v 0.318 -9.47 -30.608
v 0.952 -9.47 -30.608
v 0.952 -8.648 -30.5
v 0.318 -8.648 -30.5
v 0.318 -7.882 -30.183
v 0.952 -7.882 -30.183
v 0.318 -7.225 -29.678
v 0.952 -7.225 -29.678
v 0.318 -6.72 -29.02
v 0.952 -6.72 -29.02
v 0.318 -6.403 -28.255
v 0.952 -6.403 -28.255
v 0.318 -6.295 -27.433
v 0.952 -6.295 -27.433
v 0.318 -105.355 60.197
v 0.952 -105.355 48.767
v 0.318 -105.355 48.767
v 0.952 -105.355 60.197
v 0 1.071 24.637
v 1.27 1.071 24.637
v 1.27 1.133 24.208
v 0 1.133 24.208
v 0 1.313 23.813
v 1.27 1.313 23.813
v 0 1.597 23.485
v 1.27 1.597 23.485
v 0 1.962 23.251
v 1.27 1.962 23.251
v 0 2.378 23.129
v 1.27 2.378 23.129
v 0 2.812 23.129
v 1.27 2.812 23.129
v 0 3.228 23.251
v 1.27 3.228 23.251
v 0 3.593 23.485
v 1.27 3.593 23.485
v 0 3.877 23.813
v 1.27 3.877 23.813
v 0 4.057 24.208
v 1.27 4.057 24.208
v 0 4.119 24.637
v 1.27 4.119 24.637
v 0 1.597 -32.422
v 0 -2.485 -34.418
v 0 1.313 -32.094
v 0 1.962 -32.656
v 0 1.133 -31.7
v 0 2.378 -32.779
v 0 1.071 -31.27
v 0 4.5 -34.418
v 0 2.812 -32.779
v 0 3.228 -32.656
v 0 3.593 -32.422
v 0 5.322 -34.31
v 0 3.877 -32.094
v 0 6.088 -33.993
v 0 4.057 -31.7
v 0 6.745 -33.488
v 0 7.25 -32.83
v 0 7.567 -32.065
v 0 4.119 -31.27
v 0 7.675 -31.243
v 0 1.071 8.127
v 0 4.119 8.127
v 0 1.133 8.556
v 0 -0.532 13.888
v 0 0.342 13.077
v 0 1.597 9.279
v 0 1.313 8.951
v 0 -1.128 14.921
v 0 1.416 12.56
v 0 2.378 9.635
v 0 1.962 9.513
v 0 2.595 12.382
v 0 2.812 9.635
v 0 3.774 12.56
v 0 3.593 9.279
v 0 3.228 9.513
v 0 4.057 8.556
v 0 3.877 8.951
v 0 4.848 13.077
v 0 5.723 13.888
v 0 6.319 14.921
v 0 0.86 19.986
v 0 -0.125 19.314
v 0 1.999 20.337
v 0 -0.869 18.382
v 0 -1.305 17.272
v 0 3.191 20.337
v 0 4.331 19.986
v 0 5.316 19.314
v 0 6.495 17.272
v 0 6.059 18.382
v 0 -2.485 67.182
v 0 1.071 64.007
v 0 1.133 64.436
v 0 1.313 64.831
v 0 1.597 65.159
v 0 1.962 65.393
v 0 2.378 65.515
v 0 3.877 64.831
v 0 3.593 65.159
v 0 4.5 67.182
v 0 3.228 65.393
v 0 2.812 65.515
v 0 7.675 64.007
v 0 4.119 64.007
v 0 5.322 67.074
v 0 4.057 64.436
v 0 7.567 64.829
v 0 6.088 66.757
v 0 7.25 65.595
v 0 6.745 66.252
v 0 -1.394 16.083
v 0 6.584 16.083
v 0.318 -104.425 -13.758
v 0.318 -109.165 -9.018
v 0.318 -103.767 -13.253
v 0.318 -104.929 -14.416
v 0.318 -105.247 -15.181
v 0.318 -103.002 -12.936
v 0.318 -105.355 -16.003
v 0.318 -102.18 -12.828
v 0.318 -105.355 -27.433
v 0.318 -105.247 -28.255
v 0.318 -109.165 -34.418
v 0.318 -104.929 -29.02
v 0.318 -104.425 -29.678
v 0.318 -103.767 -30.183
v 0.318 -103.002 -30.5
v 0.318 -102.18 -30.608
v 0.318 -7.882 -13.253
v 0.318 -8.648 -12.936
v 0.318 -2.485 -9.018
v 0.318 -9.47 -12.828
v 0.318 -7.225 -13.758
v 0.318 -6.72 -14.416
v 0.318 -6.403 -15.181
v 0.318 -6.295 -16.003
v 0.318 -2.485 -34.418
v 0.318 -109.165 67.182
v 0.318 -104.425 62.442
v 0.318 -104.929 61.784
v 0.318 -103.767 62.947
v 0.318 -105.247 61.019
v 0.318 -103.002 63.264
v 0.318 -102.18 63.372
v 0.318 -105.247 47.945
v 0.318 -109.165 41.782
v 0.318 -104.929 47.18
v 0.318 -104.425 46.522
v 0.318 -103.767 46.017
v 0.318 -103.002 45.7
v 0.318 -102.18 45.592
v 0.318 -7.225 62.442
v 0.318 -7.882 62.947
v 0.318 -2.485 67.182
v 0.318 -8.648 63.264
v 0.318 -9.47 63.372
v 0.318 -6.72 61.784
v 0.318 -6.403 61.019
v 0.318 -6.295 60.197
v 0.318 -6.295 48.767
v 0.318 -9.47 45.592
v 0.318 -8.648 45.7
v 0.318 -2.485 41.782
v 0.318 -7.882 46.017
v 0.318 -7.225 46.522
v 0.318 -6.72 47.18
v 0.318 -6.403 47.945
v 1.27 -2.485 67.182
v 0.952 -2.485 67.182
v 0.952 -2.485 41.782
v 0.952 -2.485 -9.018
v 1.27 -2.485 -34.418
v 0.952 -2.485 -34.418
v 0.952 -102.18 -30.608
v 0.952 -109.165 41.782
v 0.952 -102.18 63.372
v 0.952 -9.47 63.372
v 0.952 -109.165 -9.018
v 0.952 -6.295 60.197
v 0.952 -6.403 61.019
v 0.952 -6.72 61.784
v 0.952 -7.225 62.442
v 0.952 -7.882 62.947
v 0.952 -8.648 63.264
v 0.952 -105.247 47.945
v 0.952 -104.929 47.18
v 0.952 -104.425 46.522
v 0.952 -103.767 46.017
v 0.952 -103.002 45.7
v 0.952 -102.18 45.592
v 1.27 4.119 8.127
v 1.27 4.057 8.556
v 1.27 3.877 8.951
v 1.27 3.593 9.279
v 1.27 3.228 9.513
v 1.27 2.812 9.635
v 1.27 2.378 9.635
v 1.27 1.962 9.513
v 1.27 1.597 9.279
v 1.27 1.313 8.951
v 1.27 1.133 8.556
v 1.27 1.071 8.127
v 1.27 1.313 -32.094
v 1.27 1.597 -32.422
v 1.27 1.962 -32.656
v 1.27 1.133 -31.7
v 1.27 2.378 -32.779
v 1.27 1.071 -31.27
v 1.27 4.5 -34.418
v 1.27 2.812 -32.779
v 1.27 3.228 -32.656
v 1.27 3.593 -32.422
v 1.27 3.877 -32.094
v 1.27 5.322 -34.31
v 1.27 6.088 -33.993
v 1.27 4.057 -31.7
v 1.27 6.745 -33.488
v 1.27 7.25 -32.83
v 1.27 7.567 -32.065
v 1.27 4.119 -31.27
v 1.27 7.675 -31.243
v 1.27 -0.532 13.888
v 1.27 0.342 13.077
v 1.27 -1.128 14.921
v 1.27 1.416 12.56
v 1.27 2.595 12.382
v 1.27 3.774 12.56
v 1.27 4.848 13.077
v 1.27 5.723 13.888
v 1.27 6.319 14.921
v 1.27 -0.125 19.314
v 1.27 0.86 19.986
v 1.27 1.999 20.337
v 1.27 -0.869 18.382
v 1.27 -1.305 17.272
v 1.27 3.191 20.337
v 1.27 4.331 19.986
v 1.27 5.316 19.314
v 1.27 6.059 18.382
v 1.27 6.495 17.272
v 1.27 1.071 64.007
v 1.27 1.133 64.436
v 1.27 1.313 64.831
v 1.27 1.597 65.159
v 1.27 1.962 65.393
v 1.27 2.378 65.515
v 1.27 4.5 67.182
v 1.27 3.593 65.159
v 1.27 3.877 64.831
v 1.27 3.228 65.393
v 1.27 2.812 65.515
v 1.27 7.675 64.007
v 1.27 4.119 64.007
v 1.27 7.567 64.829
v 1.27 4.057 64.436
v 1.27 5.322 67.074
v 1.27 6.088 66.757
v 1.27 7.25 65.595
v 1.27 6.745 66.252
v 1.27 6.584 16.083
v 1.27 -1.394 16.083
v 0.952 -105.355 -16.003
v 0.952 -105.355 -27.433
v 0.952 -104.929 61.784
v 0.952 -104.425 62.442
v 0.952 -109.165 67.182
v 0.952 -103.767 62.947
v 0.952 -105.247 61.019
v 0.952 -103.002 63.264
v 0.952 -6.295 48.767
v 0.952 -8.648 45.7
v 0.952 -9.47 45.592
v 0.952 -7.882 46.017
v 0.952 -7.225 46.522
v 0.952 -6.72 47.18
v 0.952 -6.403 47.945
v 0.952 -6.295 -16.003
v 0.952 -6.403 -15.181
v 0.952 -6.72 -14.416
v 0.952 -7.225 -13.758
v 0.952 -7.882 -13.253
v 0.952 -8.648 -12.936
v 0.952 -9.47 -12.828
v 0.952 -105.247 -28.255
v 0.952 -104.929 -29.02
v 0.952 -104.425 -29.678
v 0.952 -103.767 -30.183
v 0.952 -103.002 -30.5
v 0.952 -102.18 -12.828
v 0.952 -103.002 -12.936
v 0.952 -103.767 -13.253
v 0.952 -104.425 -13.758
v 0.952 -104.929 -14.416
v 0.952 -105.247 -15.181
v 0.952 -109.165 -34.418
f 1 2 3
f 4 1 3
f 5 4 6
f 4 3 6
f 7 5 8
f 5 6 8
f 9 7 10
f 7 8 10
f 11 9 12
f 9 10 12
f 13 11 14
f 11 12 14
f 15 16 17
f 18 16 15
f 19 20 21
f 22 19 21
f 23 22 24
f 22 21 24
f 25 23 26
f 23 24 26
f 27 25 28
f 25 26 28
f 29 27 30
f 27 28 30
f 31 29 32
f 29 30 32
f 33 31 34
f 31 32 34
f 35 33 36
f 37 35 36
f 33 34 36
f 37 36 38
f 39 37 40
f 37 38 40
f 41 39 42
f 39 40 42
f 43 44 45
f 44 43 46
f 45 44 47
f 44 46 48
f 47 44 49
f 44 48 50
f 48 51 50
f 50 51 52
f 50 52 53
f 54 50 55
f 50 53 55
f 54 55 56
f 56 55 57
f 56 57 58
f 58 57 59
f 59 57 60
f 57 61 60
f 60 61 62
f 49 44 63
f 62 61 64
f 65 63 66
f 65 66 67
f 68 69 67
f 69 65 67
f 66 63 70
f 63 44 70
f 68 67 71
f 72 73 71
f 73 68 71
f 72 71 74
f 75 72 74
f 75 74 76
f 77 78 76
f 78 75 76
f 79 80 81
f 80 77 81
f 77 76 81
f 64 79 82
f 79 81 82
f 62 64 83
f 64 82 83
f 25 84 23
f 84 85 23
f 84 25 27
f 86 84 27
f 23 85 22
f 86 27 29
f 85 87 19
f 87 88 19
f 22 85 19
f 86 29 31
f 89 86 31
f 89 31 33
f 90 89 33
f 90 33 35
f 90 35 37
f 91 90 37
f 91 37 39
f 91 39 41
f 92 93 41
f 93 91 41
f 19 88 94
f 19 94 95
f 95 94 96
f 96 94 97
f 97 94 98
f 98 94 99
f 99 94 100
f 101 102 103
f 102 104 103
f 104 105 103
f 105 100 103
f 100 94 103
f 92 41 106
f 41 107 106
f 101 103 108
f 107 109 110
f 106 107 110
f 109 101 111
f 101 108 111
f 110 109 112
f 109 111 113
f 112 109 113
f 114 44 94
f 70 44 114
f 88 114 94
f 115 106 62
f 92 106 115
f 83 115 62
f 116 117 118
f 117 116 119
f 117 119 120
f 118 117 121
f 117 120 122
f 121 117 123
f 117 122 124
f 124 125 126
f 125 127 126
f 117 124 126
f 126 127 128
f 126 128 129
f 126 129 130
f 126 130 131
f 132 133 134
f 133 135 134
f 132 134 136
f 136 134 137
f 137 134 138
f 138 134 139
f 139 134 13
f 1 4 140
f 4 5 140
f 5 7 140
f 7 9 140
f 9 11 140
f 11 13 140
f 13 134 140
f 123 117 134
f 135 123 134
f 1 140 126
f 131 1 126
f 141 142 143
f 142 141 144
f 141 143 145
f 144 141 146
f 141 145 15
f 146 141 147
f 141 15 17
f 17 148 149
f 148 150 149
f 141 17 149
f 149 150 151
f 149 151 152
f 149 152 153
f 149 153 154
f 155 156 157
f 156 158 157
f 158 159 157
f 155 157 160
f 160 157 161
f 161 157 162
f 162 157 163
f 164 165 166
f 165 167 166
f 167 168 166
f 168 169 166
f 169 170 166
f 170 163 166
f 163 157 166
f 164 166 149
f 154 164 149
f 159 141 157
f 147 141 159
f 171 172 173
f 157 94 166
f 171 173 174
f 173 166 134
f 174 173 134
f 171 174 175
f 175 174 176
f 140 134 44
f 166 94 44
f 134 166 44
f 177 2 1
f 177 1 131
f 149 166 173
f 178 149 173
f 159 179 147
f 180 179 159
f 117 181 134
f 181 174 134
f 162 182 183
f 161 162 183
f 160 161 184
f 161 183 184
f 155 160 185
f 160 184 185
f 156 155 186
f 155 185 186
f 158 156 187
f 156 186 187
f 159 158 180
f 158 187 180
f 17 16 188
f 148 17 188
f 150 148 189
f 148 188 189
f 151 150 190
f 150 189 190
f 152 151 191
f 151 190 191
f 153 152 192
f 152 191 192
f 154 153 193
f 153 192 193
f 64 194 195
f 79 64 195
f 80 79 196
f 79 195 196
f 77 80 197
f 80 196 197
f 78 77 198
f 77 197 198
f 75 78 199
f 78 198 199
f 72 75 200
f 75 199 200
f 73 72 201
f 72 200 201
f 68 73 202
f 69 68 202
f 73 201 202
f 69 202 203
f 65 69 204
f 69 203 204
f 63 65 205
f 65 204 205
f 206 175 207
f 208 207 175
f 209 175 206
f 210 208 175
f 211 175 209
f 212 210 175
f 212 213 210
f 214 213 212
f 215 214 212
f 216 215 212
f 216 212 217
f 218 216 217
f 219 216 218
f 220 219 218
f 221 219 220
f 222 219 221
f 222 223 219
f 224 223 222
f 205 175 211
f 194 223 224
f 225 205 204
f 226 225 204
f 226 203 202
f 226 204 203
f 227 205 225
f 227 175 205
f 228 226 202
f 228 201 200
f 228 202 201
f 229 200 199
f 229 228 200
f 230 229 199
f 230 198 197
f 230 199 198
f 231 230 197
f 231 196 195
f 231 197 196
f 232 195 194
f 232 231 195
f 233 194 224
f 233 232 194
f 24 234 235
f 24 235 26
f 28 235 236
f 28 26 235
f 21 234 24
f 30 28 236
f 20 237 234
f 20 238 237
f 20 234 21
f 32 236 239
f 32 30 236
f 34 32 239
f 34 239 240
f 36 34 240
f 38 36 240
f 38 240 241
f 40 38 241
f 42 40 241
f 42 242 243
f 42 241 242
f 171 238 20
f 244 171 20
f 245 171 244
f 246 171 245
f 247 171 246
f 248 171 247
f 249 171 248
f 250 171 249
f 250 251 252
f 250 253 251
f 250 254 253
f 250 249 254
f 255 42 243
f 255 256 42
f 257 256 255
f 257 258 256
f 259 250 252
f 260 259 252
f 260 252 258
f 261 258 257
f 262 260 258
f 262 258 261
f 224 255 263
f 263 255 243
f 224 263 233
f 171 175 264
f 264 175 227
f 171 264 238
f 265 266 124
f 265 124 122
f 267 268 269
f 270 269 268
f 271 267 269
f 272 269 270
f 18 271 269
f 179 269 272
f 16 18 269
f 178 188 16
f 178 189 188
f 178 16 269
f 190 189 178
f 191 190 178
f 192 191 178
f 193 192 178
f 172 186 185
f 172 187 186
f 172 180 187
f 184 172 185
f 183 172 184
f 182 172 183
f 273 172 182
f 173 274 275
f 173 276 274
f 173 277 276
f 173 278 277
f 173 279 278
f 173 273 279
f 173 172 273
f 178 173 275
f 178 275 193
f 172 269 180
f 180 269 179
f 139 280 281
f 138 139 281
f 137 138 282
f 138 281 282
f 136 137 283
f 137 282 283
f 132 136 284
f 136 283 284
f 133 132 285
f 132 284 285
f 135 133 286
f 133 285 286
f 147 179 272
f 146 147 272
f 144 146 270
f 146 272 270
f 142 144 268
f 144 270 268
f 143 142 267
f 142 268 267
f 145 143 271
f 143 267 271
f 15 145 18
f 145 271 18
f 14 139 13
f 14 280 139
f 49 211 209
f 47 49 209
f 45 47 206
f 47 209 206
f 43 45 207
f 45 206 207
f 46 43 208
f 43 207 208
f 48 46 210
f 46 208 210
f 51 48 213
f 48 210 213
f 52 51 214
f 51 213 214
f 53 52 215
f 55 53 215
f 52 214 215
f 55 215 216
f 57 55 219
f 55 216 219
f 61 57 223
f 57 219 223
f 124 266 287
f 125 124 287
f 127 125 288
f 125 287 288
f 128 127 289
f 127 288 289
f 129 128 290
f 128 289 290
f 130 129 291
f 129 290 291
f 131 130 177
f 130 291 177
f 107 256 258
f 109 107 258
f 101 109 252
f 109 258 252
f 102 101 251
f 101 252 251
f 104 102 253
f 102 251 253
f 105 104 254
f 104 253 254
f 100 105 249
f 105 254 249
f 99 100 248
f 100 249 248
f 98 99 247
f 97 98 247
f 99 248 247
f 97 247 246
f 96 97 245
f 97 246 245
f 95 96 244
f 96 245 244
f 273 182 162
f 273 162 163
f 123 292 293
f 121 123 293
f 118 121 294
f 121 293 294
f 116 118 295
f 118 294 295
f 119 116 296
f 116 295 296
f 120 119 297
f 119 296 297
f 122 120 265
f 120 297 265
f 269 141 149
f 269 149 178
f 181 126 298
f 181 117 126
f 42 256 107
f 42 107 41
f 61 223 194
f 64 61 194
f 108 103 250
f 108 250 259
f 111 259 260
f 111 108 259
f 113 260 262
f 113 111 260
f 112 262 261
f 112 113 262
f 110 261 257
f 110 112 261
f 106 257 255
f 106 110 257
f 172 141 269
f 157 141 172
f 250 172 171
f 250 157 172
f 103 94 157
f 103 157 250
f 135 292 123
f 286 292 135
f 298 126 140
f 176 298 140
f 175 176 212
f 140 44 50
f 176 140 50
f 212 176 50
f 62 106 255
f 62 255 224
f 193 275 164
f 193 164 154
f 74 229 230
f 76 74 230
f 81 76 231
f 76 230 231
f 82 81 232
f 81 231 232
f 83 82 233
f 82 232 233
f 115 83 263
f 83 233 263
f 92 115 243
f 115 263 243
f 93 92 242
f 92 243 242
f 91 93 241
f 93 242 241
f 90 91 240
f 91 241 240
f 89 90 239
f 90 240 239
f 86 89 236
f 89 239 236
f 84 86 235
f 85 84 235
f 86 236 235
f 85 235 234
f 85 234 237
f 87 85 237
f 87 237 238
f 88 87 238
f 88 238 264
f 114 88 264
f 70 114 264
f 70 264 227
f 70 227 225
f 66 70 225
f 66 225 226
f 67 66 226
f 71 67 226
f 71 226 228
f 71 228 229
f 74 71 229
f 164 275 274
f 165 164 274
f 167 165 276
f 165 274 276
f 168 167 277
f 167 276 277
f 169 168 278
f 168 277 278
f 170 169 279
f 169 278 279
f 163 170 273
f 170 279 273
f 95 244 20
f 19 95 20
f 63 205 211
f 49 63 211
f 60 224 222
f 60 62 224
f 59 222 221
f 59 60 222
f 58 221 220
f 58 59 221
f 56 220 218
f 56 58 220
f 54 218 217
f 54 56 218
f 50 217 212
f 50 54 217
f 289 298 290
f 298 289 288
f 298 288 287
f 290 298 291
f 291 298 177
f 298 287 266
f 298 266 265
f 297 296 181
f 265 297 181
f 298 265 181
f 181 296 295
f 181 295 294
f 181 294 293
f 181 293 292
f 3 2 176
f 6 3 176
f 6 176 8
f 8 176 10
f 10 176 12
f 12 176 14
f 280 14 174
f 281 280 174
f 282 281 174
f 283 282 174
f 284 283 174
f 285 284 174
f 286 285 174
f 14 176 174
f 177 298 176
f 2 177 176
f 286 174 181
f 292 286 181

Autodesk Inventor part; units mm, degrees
ref_plane "YZ Plane" through (0, 0, 0) normal (1, 0, 0) x (0, 1, 0)
ref_plane "XZ Plane" through (0, 0, 0) normal (0, 1, 0) x (-1, 0, 0)
ref_plane "XY Plane" through (0, 0, 0) normal (0, 0, 1) x (1, 0, 0)
sketch "Sketch1" plane through (0, 0, 0) normal (1, 0, 0) x (0, 1, 0)
  line L0 (7.6752, 16.382) -> (7.6752, -31.243)
  line L1 (7.6752, 16.382) -> (7.6752, 64.007)
  line L2 (-2.4848, 16.382) -> (-2.4848, 64.007)
  line L3 (0.6902, 67.182) -> (4.5002, 67.182)
  line L4 (-2.4848, 16.382) -> (-2.4848, -31.243)
  line L5 (0.6902, -34.418) -> (4.5002, -34.418)
  arc A0 (7.6752, 64.007) -> (4.5002, 67.182) centre (4.5002, 64.007) ccw
  arc A1 (4.5002, -34.418) -> (7.6752, -31.243) centre (4.5002, -31.243) ccw
  line L6 (-2.4848, 64.007) -> (-2.4848, 67.182)
  line L7 (-2.4848, 67.182) -> (0.6902, 67.182)
  line L8 (-2.4848, -31.243) -> (-2.4848, -34.418)
  line L9 (0.6902, -34.418) -> (-2.4848, -34.418)
  circle A2 centre (2.5952, 16.382) radius 4
  point P0 (0, 0)
  point P1 (7.6752, -34.418)
  point P2 (7.6752, 67.182)
  dimension "d1" = 50.8
  dimension "d2" = 50.8
  dimension "d3" = 3.175
  dimension "d101" = 8
extrude "Extrusion1" add sketch "Sketch1" along normal blind 1.27 contours L0 A1 L5 L9 L8 L4 L2 L6 L7 L3 A0 L1 | A2
sketch "Sketch4" plane through (0, -2.4848, 16.382) normal (0, -1, 0) x (1, 0, 0)
  line L0 (1.27, 50.8) -> (1.27, -50.8) projected
  line L1 (1.27, 0) -> (1.27, 47.625) projected
  line L2 (0.9525, 50.8) -> (0.9525, 25.4)
  line L3 (0.9525, 50.8) -> (0.3175, 50.8)
  line L4 (0.3175, 50.8) -> (0.3175, 25.4)
  line L5 (0.3175, 25.4) -> (0.9525, 25.4)
  line L6 (0, -50.8) -> (1.27, -50.8) projected
  line L7 (0.9525, -50.8) -> (0.9525, -25.4)
  line L8 (0.9525, -25.4) -> (0.3175, -25.4)
  line L9 (0.3175, -25.4) -> (0.3175, -50.8)
  line L10 (0.9525, -50.8) -> (0.3175, -50.8)
  point P0 (0, -16.382)
  dimension "d27" = 25.4
  dimension "d28" = 0.635
  dimension "d29" = 25.4
  dimension "d31" = 25.4
  dimension "d32" = 0.635
extrude "Extrusion3" add sketch "Sketch4" along normal blind 106.68
sketch "Sketch5" plane through (0.9525, -2.4848, 67.182) normal (1, 0, 0) x (0, 0, -1)
  line L0 (0, 6.985) -> (0, 0) projected
  line L1 (0, 0) -> (0, -106.68) projected
  line L2 (25.4, 0) -> (25.4, -106.68) projected
  line L3 (0, 0) -> (101.6, 0) projected
  line L4 (6.985, -3.81) -> (18.415, -3.81)
  line L5 (21.59, -6.985) -> (21.59, -99.695)
  line L6 (18.415, -102.87) -> (6.985, -102.87)
  line L7 (3.81, -99.695) -> (3.81, -6.985)
  line L8 (25.4, -106.68) -> (0, -106.68) projected
  arc A0 (6.985, -3.81) -> (3.81, -6.985) centre (6.985, -6.985) ccw
  arc A1 (21.59, -6.985) -> (18.415, -3.81) centre (18.415, -6.985) ccw
  arc A2 (3.81, -99.695) -> (6.985, -102.87) centre (6.985, -99.695) ccw
  arc A3 (18.415, -102.87) -> (21.59, -99.695) centre (18.415, -99.695) ccw
  line L9 (83.185, -3.81) -> (94.615, -3.81)
  line L10 (97.79, -6.985) -> (97.79, -99.695)
  line L11 (94.615, -102.87) -> (83.185, -102.87)
  line L12 (80.01, -99.695) -> (80.01, -6.985)
  line L13 (101.6, 0) -> (101.6, -106.68) projected
  line L14 (50.8, 0) -> (101.6, 0) projected
  line L15 (76.2, 0) -> (76.2, -106.68) projected
  line L16 (101.6, -106.68) -> (76.2, -106.68) projected
  arc A4 (83.185, -3.81) -> (80.01, -6.985) centre (83.185, -6.985) ccw
  arc A5 (97.79, -6.985) -> (94.615, -3.81) centre (94.615, -6.985) ccw
  arc A6 (80.01, -99.695) -> (83.185, -102.87) centre (83.185, -99.695) ccw
  arc A7 (94.615, -102.87) -> (97.79, -99.695) centre (94.615, -99.695) ccw
  point P0 (67.182, 2.4848)
  dimension "d67" = 3.81
  dimension "d68" = 3.81
  dimension "d69" = 3.81
  dimension "d70" = 3.81
  dimension "d71" = 3.175
  dimension "d72" = 3.81
  dimension "d73" = 3.81
  dimension "d74" = 3.81
  dimension "d75" = 3.81
  dimension "d76" = 3.175
extrude "Extrusion5" cut sketch "Sketch5" against normal through all contours L4 A1 L5 A3 L6 A2 L7 A0 | L9 A5 L10 A7 L11 A6 L12 A4
sketch "Sketch6" plane through (1.27, 0, 0) normal (1, 0, 0) x (0, 0, -1)
  line L0 (-67.182, -2.4848) -> (34.418, -2.4848) projected
  line L1 (-16.382, 7.6752) -> (-64.007, 7.6752) projected
  line L2 (-41.782, -2.4848) -> (-67.182, -2.4848) projected
  arc A0 (-64.007, 4.1192) -> (-64.007, 1.0712) centre (-64.007, 2.5952) ccw
  arc A1 (-16.382, 7.6752) -> (-16.382, -2.4848) centre (-16.382, 2.5952) ccw projected
  arc A2 (-24.637, 1.0712) -> (-24.637, 4.1192) centre (-24.637, 2.5952) ccw
  line L3 (-64.007, 4.1192) -> (-24.637, 4.1192)
  line L4 (-64.007, 1.0712) -> (-24.637, 1.0712)
  point P0 (0, 0)
  dimension "d90" = 3.048
extrude "Extrusion6" cut sketch "Sketch6" against normal through all
sketch "Sketch7" plane through (1.27, 0, 0) normal (1, 0, 0) x (0, 0, -1)
  arc A0 (-16.382, -2.4848) -> (-16.382, 7.6752) centre (-16.382, 2.5952) ccw projected
  arc A1 (-8.127, 4.1192) -> (-8.127, 1.0712) centre (-8.127, 2.5952) ccw
  arc A2 (31.2702, 1.0712) -> (31.2702, 4.1192) centre (31.2702, 2.5952) ccw
  line L0 (31.2702, 4.1192) -> (-8.127, 4.1192)
  line L1 (-8.127, 1.0712) -> (31.2702, 1.0712)
  point P0 (0, 0)
  dimension "d96" = 3.048
  dimension "d98" = 3.048
extrude "Extrusion7" cut sketch "Sketch7" against normal through all
sketch "Sketch8" plane through (1.27, 0, 0) normal (1, 0, 0) x (0, 0, -1)
  arc A0 (-24.637, 1.0712) -> (-24.637, 4.1192) centre (-24.637, 2.5952) ccw projected
  circle A1 centre (-16.382, 2.5952) radius 4
  point P0 (0, 0)
  dimension "d103" = 8
extrude "Extrusion8" cut sketch "Sketch8" against normal through all
properties part number "Part On Monitor"
